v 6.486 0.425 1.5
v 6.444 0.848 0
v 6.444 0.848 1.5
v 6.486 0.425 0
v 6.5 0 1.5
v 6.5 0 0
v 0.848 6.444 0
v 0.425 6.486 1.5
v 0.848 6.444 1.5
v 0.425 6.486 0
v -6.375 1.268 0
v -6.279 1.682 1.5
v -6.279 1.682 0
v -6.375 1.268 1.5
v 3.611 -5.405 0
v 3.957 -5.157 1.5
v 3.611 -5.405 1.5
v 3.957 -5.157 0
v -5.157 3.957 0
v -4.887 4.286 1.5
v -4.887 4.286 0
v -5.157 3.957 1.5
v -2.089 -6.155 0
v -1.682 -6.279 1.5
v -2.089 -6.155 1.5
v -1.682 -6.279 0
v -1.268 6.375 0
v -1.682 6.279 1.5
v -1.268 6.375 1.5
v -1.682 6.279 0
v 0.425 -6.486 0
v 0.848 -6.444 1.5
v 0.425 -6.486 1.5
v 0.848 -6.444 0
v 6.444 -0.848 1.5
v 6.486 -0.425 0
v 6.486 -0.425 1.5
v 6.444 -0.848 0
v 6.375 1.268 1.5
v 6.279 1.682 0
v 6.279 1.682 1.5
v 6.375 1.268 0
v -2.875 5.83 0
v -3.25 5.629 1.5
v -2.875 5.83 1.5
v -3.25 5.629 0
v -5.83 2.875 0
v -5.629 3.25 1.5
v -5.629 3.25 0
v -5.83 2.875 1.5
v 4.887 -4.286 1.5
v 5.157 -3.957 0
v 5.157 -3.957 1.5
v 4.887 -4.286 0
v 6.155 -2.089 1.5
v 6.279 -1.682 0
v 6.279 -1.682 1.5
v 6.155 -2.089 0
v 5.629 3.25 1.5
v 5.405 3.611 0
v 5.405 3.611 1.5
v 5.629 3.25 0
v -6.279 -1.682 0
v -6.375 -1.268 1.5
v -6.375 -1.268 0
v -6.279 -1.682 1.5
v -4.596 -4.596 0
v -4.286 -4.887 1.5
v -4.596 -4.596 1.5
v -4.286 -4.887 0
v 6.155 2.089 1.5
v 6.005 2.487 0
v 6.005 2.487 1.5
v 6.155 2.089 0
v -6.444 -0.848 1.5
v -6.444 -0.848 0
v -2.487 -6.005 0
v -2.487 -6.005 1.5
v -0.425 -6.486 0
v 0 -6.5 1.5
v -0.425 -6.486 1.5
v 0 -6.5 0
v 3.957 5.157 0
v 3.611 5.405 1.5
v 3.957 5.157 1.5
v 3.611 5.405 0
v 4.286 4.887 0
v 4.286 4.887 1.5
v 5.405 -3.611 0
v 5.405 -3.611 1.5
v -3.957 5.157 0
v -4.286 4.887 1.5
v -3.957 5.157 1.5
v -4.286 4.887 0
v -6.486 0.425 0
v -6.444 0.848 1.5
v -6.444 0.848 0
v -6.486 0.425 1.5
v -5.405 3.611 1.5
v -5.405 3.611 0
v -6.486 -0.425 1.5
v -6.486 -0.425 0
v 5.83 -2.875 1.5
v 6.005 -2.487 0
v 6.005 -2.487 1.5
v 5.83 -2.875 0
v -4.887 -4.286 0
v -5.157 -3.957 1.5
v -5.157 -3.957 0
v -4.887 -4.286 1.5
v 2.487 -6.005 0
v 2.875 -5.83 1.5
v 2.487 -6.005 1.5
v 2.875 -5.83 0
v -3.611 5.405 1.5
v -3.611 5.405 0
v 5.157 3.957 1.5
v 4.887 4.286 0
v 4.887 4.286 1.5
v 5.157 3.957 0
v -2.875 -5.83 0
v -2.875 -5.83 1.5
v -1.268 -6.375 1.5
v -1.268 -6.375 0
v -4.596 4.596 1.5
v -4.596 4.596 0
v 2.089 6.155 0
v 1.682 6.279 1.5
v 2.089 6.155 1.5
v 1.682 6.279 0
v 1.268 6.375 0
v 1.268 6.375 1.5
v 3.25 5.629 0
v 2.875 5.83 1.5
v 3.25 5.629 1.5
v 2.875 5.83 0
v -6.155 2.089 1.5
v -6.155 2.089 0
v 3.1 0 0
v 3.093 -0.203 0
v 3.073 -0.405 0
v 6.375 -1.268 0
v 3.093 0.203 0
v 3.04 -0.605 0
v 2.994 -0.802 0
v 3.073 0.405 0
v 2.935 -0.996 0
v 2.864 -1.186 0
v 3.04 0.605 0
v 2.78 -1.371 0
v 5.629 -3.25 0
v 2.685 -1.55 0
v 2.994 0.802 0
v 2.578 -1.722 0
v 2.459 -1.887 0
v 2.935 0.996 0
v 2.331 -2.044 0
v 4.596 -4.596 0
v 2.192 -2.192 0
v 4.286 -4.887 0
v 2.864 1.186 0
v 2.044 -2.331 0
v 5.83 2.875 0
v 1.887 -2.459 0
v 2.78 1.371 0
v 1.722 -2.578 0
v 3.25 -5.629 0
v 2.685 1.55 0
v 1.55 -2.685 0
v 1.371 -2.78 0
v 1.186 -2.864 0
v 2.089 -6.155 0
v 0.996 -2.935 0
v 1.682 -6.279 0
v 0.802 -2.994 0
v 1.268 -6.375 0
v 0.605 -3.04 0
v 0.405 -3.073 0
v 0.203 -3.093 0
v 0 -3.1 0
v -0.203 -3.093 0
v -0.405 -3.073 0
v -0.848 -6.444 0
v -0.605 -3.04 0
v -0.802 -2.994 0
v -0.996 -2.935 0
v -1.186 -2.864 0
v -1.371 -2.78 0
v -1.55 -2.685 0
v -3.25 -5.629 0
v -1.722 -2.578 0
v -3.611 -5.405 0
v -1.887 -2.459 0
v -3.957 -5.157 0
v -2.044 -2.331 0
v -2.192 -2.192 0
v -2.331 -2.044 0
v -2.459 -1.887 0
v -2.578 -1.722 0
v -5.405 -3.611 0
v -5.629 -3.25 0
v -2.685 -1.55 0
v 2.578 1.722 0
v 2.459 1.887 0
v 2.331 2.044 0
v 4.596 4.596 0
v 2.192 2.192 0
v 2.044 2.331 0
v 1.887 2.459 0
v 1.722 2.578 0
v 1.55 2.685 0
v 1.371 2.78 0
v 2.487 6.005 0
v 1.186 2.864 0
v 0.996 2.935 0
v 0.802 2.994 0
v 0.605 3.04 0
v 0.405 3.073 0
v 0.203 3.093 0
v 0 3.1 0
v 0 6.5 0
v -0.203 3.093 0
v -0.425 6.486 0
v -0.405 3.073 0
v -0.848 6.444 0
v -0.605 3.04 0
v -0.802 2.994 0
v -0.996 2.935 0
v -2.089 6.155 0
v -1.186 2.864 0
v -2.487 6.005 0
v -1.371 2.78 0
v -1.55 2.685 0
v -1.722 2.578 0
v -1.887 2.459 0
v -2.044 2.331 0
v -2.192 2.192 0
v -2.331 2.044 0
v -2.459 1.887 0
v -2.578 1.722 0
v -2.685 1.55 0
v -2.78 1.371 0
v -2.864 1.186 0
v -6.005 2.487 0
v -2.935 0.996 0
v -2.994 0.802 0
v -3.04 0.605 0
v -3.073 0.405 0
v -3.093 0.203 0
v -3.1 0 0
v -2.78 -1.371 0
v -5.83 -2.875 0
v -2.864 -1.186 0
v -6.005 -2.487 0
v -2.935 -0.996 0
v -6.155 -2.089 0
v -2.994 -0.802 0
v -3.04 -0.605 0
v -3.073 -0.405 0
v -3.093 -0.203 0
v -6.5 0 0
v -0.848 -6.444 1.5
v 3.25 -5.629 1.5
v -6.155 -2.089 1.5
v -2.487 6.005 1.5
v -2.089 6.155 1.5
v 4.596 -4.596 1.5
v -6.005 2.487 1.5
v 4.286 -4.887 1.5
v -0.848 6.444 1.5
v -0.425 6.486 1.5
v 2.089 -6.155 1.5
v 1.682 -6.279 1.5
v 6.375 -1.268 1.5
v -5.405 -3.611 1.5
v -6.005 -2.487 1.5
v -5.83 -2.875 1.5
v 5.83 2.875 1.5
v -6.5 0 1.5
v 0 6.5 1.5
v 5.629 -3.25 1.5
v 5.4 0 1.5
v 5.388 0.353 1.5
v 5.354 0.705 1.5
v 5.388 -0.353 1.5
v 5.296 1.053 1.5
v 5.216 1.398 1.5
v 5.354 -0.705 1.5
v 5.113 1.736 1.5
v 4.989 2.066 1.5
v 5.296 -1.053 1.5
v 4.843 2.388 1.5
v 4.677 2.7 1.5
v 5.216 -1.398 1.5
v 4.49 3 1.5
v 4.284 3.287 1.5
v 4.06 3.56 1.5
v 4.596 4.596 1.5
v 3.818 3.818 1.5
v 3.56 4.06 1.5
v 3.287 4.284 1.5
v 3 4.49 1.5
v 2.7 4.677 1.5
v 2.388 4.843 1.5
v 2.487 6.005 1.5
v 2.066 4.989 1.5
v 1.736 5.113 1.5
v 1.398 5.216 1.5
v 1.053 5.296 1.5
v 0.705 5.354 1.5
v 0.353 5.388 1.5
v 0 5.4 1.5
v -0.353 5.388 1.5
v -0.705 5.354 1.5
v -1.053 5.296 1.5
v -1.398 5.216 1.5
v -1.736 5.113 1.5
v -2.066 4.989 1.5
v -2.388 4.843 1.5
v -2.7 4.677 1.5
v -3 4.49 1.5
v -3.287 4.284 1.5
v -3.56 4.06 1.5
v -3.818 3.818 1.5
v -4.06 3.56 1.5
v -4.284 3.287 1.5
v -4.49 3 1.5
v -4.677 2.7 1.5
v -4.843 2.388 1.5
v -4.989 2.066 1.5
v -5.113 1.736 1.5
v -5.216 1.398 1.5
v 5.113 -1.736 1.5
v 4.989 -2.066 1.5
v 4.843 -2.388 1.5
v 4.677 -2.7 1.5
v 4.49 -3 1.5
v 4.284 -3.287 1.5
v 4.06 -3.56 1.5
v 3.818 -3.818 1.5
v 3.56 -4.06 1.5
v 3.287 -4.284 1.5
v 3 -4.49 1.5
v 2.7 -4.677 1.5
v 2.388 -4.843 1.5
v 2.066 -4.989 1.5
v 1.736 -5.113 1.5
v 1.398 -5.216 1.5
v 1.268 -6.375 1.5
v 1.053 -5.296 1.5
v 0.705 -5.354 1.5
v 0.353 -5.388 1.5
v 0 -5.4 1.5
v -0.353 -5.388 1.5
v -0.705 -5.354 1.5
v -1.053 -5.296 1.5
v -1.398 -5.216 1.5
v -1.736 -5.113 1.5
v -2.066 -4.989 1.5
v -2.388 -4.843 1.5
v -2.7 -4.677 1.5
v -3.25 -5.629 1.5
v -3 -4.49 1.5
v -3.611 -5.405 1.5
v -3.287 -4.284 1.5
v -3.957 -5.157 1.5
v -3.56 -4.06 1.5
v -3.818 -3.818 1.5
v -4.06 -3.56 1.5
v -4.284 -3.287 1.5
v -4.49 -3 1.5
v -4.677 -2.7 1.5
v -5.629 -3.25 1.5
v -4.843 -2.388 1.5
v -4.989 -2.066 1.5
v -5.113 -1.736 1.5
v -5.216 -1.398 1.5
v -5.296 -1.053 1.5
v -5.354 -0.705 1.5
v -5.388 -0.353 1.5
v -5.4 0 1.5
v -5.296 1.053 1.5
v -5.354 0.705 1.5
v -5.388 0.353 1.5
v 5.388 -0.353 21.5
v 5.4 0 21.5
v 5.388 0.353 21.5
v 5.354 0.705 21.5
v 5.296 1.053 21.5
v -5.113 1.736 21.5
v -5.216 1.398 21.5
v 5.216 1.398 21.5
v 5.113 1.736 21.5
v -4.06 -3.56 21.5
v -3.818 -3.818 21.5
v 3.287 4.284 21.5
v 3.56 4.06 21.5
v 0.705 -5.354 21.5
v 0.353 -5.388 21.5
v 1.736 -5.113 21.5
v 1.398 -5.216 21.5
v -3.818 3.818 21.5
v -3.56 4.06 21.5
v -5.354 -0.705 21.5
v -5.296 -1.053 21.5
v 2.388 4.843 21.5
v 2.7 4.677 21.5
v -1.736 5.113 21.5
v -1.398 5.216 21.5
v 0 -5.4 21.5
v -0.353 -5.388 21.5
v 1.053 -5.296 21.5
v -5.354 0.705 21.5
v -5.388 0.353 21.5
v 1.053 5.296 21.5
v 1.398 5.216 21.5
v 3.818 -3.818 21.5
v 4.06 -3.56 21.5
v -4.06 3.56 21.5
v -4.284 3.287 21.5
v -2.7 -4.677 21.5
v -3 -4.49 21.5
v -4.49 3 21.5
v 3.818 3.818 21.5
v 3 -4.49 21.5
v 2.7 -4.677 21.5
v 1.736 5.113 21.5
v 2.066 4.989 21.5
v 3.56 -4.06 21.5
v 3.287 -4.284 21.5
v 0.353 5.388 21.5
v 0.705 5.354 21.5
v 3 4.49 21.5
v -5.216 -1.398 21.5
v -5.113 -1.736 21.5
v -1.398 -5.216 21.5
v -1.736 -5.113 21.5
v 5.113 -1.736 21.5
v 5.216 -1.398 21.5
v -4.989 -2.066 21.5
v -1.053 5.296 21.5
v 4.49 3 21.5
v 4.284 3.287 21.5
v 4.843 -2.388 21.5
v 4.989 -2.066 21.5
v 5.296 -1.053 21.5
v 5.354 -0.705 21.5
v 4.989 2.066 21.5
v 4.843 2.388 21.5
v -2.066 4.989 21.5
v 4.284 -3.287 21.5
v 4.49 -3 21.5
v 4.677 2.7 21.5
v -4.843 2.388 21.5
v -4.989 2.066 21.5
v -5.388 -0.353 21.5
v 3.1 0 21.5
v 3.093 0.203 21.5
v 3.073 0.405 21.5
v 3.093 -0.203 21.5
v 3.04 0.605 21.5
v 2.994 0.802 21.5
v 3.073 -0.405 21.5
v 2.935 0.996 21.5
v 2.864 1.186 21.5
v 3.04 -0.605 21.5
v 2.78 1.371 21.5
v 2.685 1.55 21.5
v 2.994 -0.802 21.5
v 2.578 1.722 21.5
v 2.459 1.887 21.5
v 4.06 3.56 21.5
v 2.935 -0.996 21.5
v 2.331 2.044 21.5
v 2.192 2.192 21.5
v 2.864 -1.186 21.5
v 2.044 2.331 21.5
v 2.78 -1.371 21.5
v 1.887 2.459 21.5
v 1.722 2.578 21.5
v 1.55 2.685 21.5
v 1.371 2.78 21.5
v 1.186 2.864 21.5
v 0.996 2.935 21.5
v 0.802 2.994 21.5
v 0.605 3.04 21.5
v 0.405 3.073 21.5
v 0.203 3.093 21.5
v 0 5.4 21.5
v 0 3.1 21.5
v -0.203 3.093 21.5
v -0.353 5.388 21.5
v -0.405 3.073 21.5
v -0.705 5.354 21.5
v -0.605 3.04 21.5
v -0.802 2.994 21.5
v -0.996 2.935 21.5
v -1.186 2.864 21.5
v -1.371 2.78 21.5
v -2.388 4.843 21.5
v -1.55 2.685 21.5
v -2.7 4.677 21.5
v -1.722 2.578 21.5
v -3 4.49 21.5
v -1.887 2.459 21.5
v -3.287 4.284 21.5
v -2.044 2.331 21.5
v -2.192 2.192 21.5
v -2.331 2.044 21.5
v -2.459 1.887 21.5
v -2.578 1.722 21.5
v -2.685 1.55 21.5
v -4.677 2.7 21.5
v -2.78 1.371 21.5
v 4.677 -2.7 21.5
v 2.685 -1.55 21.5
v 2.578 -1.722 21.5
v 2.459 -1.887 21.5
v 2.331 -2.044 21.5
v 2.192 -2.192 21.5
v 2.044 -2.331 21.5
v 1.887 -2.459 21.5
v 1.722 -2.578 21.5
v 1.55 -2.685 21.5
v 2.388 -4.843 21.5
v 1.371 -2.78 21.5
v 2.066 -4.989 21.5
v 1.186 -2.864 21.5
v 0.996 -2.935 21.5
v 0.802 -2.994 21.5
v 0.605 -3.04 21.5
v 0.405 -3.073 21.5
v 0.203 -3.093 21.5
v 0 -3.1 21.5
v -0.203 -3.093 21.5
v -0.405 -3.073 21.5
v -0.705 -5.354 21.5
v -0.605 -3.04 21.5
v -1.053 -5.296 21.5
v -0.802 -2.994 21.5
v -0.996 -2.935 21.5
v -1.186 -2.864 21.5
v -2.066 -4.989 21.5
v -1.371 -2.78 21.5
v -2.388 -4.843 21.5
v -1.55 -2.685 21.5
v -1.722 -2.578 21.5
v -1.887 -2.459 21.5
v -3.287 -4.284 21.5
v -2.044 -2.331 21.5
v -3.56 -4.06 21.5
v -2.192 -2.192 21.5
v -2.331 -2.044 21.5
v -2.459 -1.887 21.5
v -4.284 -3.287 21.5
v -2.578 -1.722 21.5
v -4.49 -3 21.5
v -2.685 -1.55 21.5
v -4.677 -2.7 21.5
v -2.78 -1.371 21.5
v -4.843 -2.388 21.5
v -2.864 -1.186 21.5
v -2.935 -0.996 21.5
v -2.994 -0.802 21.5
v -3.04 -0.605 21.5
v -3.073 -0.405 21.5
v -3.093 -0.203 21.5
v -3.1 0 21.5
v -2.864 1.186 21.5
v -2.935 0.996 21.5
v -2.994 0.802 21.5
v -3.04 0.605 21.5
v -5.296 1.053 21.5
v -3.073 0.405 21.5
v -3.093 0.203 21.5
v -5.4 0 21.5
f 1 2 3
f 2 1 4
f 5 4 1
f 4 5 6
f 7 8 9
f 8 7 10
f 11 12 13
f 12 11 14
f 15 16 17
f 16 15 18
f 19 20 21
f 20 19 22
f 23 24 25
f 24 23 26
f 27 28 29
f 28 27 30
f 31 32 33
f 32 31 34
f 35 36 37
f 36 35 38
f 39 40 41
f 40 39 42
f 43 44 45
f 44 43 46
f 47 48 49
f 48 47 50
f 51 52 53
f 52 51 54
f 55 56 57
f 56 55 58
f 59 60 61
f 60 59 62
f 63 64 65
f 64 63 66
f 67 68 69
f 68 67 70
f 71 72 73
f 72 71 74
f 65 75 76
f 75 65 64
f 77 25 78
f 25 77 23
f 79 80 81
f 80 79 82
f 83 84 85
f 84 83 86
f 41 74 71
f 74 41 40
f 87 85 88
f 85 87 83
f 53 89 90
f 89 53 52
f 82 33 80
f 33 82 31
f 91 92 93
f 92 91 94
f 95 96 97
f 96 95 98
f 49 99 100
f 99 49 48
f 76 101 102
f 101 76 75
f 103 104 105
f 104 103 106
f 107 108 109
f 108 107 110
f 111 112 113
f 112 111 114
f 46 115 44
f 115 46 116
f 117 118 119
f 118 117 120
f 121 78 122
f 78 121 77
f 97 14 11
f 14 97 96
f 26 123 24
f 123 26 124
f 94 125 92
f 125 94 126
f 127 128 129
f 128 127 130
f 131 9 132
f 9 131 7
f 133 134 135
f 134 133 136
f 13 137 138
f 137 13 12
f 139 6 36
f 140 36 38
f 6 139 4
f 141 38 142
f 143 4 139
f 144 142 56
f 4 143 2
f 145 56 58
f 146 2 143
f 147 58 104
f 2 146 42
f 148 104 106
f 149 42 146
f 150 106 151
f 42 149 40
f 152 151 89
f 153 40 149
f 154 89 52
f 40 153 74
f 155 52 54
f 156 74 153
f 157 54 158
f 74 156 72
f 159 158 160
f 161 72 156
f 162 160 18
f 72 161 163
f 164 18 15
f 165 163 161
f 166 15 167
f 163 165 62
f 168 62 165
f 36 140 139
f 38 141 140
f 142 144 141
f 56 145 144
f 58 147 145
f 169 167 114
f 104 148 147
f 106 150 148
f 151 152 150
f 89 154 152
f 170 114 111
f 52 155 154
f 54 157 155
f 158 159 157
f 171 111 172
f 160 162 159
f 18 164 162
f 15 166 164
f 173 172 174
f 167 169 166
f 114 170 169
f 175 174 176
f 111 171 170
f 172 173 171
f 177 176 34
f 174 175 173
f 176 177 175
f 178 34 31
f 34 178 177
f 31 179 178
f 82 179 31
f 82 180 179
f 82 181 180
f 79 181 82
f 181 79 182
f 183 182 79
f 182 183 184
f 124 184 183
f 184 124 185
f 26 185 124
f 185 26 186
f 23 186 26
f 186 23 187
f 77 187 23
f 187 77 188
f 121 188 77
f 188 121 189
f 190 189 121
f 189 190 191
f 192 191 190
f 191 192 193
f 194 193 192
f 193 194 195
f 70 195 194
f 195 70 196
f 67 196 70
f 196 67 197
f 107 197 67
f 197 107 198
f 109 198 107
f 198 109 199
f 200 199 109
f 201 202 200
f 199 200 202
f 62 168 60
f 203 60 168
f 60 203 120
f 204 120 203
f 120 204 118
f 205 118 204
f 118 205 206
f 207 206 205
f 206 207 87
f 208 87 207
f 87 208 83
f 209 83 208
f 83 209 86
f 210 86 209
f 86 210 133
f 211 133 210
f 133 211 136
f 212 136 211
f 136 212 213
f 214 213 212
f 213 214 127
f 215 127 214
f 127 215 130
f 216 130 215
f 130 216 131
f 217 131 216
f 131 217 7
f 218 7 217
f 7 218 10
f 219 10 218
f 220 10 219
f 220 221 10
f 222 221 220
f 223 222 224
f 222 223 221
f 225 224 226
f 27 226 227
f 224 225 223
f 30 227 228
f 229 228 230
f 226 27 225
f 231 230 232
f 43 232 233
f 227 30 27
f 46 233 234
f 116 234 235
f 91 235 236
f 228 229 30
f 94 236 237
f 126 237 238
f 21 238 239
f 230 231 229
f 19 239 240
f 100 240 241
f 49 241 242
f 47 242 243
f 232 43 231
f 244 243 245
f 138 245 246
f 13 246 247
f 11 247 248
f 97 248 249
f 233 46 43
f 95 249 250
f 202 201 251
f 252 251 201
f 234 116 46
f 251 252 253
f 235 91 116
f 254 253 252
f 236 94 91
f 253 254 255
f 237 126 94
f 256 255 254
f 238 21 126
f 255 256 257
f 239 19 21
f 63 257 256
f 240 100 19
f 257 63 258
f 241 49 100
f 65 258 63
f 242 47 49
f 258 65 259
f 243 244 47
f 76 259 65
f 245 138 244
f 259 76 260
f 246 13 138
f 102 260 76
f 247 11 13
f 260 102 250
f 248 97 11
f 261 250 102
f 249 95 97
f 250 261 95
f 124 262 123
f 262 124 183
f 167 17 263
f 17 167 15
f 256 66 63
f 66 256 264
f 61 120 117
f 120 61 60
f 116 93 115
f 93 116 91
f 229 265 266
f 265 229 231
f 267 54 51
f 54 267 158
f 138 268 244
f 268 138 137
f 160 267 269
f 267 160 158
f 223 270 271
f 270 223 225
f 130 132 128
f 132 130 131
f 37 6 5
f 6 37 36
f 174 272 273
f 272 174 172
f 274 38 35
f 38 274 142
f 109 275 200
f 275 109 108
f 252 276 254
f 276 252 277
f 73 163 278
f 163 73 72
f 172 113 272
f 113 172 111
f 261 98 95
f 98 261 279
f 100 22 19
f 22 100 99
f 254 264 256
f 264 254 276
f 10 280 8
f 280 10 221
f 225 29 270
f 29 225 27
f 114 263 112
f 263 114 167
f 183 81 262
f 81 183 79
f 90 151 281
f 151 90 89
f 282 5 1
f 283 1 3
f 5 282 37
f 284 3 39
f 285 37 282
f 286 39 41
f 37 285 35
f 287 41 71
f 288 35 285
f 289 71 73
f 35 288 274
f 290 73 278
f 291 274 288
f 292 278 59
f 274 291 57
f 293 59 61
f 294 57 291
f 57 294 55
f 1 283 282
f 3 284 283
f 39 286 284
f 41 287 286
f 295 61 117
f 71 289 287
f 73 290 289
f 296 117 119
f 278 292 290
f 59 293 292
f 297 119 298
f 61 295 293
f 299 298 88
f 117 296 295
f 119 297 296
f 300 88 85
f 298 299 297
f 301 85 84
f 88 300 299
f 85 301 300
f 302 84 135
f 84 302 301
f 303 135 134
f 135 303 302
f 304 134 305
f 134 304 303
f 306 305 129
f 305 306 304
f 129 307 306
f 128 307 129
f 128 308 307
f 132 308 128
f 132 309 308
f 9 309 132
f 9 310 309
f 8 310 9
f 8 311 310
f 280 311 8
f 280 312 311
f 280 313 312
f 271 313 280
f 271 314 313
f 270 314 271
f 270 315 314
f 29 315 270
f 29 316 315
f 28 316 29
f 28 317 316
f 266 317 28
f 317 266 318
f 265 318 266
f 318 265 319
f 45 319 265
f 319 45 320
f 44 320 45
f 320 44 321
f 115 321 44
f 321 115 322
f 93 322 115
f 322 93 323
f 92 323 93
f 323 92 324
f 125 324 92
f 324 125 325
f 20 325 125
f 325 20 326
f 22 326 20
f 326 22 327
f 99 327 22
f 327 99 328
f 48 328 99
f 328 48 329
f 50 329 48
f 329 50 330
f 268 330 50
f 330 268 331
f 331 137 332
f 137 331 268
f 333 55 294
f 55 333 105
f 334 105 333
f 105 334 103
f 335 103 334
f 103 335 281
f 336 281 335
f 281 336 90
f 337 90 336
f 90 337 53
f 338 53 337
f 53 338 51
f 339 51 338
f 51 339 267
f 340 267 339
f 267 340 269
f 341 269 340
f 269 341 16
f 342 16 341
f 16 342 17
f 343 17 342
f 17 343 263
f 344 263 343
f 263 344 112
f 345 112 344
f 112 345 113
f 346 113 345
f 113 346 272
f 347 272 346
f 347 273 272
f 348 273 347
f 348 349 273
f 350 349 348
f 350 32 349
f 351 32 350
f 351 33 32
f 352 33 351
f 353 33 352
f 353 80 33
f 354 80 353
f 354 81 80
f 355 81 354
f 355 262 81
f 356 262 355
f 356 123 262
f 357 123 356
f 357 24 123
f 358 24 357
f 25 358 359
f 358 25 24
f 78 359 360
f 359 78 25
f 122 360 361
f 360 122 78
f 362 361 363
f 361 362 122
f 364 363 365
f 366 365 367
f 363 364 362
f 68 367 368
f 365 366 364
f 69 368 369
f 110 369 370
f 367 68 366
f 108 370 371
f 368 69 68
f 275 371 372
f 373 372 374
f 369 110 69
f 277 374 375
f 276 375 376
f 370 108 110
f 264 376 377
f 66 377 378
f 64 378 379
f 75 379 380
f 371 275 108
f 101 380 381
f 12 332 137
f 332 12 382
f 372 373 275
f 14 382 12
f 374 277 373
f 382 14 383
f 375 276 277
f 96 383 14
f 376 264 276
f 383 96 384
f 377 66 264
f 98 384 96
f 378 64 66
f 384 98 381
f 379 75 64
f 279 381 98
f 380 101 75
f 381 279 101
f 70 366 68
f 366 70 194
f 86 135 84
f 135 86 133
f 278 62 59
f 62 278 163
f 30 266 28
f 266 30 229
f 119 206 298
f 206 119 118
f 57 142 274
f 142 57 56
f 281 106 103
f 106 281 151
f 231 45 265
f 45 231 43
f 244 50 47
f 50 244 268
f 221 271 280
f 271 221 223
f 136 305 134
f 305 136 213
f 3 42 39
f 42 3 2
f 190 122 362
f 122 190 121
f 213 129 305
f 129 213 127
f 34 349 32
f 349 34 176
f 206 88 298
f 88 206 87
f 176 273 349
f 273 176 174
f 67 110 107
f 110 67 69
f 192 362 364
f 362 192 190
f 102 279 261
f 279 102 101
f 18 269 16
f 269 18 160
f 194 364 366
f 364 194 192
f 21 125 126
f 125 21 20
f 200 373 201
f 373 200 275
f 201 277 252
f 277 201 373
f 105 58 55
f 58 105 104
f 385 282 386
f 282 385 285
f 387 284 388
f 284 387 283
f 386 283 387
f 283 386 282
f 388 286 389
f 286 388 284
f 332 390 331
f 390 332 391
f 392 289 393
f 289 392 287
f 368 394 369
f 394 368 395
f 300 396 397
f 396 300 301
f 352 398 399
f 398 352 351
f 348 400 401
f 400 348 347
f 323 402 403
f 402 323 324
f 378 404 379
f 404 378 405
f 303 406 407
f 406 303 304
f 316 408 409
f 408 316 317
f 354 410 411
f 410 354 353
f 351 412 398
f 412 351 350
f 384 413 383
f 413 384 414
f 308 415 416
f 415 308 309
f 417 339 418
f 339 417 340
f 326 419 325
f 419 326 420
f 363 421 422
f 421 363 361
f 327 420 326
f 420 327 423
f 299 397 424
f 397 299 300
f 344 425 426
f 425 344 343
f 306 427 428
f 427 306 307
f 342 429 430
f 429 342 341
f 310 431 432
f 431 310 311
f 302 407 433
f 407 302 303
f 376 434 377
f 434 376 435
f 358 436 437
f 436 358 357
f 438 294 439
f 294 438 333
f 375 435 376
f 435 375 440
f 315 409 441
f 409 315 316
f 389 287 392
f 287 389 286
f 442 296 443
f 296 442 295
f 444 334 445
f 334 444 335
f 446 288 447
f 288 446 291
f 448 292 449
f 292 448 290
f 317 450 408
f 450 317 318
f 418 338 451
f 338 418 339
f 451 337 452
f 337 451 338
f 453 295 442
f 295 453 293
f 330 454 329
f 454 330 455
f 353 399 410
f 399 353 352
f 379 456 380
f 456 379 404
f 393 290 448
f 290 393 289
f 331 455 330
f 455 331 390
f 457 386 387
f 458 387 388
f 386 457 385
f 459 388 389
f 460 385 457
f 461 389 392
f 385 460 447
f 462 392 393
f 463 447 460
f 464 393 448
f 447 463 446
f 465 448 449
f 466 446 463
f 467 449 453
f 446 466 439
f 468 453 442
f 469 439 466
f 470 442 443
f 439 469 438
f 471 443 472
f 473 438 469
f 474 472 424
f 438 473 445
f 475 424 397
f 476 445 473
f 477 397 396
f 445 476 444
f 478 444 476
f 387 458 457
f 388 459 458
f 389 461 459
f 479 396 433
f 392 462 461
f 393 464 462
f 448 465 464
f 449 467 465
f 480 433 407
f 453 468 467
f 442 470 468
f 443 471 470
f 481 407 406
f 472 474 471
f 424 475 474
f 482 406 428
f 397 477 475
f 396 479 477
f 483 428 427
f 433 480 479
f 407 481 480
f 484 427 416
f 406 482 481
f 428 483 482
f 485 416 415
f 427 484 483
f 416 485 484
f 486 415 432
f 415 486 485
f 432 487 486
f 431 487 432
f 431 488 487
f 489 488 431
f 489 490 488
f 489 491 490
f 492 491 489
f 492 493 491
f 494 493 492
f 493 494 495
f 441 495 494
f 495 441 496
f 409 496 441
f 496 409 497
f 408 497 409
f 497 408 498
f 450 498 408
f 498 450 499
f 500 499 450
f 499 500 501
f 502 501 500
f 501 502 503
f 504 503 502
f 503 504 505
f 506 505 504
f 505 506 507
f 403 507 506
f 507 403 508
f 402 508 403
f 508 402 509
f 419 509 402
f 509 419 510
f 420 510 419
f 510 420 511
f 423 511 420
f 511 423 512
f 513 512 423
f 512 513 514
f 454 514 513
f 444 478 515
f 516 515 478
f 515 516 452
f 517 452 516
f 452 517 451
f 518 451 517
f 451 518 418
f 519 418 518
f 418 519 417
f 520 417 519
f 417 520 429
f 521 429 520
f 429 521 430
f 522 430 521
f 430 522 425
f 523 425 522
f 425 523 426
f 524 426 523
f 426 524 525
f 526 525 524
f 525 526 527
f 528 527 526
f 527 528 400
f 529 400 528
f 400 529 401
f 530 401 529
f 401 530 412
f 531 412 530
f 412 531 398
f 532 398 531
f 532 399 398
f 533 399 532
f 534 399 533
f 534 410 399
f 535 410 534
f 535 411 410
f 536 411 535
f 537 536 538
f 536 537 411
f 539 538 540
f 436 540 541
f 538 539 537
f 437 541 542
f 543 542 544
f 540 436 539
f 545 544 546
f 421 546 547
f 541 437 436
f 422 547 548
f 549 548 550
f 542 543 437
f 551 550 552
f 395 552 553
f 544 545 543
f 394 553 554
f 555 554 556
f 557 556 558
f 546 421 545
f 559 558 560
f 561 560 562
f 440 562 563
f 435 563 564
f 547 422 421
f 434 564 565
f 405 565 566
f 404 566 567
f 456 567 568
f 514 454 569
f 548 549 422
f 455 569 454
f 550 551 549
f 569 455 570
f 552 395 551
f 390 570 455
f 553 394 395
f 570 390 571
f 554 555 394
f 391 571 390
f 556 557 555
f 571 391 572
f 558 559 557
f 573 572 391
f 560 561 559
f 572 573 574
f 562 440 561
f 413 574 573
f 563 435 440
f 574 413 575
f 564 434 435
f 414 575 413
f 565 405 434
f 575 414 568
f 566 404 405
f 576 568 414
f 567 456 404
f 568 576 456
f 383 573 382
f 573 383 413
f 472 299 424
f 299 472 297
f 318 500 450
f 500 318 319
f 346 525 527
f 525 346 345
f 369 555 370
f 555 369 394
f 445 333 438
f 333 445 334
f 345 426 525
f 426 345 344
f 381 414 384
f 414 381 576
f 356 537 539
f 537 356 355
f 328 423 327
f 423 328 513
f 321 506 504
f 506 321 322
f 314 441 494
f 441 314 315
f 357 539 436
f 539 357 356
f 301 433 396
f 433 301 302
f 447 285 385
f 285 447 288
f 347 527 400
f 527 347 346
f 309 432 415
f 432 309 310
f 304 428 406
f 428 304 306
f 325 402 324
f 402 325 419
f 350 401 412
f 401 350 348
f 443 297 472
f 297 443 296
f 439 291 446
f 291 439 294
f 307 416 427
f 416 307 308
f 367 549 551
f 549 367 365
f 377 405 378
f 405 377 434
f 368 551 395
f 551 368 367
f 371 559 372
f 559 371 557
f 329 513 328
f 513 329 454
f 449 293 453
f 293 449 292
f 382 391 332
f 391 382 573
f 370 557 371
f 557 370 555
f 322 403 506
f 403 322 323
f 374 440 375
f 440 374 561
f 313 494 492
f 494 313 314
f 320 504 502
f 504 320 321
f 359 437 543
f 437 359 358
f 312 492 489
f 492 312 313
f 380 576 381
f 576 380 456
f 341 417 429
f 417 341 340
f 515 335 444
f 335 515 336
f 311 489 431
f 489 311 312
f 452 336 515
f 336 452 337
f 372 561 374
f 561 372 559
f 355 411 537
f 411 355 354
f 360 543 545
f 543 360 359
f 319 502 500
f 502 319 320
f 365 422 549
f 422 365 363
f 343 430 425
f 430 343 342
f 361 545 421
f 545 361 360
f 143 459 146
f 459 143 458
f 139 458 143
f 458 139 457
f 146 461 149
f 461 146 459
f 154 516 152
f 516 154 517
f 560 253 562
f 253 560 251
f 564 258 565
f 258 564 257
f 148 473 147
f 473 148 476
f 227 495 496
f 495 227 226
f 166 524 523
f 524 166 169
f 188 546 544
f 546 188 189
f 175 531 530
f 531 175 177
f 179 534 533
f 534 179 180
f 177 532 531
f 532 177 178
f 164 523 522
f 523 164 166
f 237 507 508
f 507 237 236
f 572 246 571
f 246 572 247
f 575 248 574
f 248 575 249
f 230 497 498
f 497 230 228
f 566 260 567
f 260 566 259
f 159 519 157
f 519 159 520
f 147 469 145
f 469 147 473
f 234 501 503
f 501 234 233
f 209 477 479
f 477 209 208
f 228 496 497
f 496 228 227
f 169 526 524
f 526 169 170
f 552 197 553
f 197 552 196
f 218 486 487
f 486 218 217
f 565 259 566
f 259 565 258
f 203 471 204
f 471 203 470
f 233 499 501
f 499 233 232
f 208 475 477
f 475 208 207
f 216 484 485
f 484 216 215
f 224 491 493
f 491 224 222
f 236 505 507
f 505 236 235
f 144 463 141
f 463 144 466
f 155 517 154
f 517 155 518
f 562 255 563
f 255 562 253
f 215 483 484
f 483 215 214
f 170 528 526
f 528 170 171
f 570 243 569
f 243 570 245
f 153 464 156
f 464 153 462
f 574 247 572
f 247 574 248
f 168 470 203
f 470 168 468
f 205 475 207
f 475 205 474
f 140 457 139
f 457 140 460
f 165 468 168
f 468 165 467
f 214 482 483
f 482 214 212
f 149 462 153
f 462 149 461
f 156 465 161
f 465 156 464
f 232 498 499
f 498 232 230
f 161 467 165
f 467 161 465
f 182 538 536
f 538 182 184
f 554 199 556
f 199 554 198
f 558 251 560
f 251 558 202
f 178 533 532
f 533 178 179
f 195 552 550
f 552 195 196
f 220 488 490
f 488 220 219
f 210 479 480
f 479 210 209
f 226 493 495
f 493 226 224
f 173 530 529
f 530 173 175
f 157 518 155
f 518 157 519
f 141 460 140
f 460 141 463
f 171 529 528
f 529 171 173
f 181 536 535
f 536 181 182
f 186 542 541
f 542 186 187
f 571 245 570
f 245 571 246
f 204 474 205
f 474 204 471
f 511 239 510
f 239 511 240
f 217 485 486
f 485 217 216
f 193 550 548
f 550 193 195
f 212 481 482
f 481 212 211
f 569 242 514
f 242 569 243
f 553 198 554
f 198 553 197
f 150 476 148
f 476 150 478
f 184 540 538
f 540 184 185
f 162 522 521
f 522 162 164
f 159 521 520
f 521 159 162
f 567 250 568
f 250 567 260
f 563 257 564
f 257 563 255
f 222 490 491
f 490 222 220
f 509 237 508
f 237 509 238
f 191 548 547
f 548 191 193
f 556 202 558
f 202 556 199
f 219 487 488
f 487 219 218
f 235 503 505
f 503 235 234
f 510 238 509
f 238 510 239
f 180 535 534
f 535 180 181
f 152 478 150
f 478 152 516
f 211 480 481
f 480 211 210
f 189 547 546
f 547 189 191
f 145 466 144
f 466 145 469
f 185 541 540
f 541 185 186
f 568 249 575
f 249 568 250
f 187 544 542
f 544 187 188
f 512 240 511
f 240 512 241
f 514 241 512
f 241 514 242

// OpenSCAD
// PCR tube adapter sleeve: 0.2 mL tube in a 1.5 mL rack hole
// Print orientation: collar on the bed, sleeve body rising upward

$fn = 96;

// ---- Dimensions (mm) ----
collar_d      = 13;    // collar outer diameter
collar_h      = 1.5;   // collar thickness (z = 0 to 1.5)
sleeve_od     = 10.8;  // sleeve body outer diameter
sleeve_top_z  = 21.5;  // top of sleeve body (z)
bore_d        = 6.2;   // through-bore diameter
eps           = 0.5;   // cutter overshoot past faces

total_h = sleeve_top_z; // overall height (21.5)

difference() {
    union() {
        // Collar
        cylinder(d = collar_d, h = collar_h);
        // Sleeve body (overlaps slightly into collar for a clean union)
        translate([0, 0, collar_h - 0.01])
            cylinder(d = sleeve_od, h = total_h - collar_h + 0.01);
    }
    // Through-bore
    translate([0, 0, -eps])
        cylinder(d = bore_d, h = total_h + 2 * eps);
}
